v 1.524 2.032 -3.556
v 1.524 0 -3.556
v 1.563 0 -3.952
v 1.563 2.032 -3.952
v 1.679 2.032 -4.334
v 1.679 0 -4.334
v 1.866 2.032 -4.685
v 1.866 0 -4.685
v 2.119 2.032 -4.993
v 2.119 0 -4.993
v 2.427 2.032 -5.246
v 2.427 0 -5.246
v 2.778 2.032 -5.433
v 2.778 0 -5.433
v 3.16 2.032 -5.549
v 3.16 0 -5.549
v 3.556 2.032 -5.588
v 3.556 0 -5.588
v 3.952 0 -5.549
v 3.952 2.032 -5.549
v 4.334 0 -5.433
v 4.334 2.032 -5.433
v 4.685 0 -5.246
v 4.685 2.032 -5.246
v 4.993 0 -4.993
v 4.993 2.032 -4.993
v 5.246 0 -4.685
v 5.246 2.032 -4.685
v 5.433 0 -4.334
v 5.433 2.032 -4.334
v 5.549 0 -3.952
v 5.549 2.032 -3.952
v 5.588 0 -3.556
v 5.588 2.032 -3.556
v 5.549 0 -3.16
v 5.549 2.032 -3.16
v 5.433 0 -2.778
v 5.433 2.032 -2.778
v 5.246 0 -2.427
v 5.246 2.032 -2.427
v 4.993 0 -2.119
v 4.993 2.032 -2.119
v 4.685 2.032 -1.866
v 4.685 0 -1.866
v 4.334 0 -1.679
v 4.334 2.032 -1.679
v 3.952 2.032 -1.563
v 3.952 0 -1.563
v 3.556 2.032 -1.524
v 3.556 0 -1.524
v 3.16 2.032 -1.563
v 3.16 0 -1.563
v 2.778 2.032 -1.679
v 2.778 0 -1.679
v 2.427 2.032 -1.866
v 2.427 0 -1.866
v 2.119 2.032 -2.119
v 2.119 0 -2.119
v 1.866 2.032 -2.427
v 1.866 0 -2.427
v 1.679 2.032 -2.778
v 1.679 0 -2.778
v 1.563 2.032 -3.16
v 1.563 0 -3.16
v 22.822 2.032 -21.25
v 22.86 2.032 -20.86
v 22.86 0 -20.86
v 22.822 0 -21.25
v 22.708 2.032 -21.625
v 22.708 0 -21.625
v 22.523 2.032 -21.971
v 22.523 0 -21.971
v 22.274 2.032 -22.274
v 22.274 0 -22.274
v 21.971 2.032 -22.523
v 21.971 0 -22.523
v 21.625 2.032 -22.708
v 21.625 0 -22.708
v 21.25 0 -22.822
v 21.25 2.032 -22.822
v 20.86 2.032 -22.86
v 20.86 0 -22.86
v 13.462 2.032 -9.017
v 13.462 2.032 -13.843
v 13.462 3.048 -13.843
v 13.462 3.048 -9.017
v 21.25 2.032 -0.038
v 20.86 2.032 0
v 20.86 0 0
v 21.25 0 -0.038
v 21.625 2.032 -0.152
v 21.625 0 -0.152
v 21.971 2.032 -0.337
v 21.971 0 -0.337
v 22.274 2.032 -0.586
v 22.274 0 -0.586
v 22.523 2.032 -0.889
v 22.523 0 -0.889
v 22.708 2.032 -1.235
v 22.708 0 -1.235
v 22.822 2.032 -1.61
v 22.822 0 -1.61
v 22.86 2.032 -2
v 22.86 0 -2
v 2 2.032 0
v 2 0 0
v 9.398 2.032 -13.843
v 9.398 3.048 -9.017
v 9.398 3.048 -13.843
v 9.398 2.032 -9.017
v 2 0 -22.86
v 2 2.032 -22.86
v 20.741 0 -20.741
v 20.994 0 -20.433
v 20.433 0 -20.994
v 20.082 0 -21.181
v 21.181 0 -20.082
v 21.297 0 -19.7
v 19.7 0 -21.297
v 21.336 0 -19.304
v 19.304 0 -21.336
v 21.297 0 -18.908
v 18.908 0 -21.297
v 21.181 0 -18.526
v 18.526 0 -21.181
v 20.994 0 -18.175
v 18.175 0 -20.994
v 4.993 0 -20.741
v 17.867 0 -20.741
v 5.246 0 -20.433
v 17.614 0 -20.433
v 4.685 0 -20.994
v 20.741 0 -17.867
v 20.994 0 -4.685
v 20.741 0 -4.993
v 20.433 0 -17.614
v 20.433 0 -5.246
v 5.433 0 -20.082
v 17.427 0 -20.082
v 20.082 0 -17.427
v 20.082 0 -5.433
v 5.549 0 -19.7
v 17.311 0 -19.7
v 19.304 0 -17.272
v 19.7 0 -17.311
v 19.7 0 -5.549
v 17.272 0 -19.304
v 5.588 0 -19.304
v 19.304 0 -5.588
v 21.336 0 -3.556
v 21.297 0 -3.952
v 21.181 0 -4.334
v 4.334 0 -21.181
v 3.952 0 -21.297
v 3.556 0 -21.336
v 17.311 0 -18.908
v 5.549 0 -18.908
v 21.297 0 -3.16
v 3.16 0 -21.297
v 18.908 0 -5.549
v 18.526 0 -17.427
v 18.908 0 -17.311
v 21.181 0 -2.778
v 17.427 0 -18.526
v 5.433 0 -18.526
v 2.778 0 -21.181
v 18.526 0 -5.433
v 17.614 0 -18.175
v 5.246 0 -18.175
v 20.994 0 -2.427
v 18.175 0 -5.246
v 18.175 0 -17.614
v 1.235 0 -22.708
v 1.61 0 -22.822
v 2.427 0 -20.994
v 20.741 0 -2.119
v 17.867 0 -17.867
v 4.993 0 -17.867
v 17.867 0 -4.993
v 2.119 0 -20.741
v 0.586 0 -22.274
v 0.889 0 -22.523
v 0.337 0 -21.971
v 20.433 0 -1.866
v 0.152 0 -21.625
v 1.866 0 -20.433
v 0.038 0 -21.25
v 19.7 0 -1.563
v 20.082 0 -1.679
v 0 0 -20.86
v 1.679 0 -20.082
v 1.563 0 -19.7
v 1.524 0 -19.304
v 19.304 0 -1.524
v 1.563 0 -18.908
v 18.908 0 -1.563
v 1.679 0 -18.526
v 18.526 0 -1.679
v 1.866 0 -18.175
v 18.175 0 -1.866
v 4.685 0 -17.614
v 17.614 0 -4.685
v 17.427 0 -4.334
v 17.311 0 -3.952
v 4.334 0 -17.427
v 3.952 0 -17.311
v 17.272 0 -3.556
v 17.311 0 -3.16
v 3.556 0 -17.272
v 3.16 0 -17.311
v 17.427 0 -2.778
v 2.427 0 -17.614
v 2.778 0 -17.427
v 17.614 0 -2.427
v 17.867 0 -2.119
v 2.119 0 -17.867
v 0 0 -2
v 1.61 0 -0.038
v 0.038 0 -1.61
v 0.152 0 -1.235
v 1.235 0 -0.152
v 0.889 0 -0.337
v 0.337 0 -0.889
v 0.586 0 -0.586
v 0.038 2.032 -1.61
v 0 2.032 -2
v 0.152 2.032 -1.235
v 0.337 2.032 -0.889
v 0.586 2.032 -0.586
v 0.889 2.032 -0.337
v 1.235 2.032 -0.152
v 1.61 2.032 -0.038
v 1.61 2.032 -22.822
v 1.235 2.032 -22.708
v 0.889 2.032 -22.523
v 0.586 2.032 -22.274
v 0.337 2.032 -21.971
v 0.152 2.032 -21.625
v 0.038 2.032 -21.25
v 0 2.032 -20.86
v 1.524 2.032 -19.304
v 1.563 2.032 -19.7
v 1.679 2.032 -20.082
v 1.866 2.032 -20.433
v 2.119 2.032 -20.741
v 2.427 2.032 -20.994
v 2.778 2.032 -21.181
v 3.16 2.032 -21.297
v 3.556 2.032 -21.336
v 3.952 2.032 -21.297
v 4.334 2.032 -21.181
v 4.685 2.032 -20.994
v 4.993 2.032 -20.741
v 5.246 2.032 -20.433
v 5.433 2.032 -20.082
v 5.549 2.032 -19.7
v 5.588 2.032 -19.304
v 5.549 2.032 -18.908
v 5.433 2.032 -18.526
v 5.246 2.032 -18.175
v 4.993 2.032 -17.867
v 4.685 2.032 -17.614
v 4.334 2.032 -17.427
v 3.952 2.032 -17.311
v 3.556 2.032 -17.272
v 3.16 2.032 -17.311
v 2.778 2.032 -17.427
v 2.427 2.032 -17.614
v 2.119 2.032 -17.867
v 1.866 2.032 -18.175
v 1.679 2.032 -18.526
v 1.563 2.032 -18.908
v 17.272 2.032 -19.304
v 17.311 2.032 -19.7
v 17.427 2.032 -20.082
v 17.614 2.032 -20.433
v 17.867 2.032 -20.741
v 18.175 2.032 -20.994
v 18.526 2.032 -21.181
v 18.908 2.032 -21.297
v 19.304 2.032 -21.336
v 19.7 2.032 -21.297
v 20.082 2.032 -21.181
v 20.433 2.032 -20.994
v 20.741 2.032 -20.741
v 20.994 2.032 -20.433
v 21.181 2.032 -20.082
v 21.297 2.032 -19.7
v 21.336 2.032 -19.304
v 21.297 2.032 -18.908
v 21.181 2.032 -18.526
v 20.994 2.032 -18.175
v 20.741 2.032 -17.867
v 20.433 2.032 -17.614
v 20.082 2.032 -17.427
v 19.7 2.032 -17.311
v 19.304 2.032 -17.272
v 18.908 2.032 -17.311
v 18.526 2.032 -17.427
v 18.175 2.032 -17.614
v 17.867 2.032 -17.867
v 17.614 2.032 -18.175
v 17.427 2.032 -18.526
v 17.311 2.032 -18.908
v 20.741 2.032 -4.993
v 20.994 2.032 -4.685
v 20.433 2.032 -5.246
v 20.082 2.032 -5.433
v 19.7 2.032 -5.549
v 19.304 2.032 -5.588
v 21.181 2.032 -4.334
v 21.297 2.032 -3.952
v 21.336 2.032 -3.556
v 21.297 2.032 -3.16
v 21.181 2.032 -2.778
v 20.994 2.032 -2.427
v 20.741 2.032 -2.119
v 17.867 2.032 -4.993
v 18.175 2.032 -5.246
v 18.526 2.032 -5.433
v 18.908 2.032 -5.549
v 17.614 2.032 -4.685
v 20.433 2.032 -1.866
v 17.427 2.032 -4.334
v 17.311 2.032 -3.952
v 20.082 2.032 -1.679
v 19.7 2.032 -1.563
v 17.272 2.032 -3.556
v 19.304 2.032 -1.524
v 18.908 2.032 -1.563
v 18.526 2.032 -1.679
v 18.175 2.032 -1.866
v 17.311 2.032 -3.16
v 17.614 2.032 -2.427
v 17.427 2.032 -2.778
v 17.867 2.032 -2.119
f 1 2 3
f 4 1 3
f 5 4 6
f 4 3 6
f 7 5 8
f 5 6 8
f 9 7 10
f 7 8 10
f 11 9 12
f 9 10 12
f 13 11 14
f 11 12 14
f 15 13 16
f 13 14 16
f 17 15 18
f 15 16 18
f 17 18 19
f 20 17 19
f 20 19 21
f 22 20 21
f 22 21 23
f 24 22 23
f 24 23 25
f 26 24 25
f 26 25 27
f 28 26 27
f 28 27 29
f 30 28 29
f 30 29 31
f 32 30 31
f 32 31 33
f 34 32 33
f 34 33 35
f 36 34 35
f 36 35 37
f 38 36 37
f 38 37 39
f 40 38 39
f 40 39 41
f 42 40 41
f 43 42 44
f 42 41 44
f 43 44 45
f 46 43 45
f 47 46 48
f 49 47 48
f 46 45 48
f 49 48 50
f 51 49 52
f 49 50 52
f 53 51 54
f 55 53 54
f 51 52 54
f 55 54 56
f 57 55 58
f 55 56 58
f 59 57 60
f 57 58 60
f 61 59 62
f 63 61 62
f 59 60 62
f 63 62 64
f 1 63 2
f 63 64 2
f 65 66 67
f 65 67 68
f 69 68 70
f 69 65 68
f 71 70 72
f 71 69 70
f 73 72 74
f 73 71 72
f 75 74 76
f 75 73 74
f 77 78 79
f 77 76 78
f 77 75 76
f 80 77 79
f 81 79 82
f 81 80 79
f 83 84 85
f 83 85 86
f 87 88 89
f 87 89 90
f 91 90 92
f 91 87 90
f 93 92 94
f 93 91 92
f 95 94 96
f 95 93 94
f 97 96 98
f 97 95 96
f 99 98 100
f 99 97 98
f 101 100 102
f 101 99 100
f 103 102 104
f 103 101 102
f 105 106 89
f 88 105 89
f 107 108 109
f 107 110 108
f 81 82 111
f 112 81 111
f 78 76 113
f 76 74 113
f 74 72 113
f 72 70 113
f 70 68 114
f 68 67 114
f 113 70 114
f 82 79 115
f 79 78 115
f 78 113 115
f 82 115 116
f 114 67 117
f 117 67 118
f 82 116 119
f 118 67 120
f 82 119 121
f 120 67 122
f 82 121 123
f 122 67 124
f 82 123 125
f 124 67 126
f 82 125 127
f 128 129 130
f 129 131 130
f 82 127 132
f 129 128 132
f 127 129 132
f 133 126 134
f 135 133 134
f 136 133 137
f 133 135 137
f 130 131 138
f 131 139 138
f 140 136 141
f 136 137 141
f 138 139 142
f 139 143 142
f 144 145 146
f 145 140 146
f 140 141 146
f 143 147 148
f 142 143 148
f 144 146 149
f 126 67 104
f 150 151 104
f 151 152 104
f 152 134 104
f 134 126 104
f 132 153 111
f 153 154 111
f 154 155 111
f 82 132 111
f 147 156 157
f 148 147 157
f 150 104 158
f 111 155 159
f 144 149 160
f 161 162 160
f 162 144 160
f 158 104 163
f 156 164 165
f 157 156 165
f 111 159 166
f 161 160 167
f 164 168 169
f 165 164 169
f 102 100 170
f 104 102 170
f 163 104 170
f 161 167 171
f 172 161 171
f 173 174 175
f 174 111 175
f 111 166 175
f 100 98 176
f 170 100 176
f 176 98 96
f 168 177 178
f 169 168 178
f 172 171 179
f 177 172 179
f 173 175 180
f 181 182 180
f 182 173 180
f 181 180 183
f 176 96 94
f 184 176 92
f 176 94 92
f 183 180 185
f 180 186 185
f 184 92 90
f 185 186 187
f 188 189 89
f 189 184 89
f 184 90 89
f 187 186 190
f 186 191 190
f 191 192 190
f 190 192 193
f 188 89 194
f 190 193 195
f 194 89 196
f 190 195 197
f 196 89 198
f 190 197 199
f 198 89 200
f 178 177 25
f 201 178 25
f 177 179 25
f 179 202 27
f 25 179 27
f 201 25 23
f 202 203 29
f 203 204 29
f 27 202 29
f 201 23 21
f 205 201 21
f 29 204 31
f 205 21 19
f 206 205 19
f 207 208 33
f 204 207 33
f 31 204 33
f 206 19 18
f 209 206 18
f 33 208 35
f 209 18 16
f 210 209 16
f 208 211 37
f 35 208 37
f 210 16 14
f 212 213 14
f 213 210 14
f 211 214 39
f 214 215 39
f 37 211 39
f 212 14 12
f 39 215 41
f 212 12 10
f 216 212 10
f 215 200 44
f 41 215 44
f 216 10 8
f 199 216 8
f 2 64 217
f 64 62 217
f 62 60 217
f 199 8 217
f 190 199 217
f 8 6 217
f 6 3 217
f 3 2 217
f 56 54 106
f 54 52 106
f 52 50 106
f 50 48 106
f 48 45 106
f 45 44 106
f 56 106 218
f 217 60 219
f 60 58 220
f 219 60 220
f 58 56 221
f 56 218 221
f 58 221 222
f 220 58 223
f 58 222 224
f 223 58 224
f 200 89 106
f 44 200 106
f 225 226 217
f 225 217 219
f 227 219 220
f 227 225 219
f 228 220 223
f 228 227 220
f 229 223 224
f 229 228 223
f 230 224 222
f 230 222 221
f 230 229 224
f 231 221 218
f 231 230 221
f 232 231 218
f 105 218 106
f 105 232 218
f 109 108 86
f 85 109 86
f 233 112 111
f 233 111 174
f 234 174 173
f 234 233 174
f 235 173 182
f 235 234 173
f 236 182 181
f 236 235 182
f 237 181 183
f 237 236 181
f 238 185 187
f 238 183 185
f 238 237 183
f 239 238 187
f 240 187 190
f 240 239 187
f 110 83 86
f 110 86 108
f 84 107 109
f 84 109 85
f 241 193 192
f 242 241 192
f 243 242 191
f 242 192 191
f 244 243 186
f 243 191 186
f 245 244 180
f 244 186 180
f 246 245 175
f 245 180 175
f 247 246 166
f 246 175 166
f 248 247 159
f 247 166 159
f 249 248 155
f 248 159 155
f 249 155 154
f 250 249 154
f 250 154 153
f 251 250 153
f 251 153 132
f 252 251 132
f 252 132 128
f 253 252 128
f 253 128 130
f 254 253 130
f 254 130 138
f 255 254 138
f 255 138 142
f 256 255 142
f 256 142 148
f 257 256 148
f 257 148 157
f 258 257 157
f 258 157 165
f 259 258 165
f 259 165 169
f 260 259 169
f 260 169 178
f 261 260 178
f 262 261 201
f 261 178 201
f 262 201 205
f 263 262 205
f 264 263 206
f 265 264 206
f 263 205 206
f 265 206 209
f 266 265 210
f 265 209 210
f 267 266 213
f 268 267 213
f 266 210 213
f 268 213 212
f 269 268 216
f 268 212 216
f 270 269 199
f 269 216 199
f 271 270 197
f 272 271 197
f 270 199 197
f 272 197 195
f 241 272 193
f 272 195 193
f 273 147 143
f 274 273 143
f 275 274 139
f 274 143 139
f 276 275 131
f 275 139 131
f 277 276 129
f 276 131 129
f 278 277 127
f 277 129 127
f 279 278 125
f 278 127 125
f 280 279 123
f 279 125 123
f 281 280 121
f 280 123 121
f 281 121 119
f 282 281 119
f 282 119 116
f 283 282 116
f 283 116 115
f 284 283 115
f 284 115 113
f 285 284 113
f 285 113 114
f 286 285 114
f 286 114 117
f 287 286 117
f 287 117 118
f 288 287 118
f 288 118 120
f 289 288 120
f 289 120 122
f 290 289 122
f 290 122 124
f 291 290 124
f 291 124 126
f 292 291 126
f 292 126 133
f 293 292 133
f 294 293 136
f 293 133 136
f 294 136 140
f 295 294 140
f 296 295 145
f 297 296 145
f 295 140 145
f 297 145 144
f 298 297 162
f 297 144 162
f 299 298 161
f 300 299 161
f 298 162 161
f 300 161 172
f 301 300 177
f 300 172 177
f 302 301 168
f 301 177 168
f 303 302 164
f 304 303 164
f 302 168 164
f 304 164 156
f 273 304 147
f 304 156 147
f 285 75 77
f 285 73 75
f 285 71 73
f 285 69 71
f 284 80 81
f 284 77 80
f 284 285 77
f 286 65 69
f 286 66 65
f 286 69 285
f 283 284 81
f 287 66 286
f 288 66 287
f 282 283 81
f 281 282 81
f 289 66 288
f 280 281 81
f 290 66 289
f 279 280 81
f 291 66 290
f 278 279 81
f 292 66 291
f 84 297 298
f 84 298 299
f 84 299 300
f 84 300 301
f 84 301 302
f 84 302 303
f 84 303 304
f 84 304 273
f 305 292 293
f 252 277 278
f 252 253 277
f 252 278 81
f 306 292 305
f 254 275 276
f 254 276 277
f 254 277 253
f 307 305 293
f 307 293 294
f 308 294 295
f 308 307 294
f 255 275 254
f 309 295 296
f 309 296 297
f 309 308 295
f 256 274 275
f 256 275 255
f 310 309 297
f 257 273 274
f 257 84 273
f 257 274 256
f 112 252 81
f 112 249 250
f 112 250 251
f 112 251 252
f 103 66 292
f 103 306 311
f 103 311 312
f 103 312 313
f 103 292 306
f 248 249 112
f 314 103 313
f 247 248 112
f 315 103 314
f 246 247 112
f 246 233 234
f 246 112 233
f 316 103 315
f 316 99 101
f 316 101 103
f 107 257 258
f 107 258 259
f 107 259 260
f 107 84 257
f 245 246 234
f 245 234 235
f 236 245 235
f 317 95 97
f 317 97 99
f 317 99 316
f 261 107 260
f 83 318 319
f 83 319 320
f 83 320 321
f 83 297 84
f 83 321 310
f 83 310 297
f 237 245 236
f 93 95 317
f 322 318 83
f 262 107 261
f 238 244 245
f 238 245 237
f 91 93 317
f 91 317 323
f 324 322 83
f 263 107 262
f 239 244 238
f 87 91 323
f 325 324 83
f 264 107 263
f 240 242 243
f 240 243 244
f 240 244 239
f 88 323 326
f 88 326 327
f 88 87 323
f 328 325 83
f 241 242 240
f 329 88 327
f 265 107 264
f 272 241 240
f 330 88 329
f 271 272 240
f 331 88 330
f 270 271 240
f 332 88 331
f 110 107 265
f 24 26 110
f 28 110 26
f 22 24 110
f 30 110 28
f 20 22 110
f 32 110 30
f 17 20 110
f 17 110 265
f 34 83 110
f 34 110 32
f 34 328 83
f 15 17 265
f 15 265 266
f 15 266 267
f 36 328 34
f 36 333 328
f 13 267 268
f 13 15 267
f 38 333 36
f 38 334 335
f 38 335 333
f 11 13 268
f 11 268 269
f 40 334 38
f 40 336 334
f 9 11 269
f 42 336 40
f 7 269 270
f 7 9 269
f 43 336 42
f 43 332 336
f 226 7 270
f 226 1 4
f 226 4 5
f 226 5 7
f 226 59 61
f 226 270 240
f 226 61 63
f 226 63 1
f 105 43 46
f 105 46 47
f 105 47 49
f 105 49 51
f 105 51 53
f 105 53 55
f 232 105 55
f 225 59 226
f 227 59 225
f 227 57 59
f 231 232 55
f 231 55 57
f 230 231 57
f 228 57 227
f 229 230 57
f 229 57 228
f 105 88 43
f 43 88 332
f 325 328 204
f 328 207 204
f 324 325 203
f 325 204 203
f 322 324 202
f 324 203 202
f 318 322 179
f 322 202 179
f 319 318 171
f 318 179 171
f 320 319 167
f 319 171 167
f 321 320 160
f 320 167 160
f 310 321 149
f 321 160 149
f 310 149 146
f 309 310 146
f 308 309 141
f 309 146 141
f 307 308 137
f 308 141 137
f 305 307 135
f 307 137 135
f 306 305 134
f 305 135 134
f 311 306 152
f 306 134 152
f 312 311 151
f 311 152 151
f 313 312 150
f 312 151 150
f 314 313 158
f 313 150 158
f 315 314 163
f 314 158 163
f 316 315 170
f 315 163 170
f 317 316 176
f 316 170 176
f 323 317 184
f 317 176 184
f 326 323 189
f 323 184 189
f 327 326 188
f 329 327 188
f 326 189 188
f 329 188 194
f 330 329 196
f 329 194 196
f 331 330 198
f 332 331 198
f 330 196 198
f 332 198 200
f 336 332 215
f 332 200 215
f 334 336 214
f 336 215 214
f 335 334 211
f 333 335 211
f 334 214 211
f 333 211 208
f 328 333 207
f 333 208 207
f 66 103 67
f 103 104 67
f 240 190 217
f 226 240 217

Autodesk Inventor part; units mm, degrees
ref_plane "YZ Plane" through (0, 0, 0) normal (1, 0, 0) x (0, 1, 0)
ref_plane "XZ Plane" through (0, 0, 0) normal (0, 1, 0) x (-1, 0, 0)
ref_plane "XY Plane" through (0, 0, 0) normal (0, 0, 1) x (1, 0, 0)
sketch "Sketch1" plane through (0, 0, 0) normal (0, 1, 0) x (-1, 0, 0)
  line L0 (0, 0) -> (-22.86, 0)
  line L1 (-22.86, 0) -> (-22.86, -22.86)
  line L2 (-22.86, -22.86) -> (0, -22.86)
  line L3 (0, -22.86) -> (0, 0)
  line L4 (-22.86, -22.86) -> (-19.304, -22.86)
  line L5 (-19.304, -22.86) -> (-19.304, -19.304) construction
  line L6 (-19.304, -19.304) -> (-22.86, -19.304) construction
  line L7 (-22.86, -19.304) -> (-22.86, -22.86)
  line L8 (0, -22.86) -> (-3.556, -22.86)
  line L9 (-3.556, -22.86) -> (-3.556, -19.304) construction
  line L10 (-3.556, -19.304) -> (0, -19.304) construction
  line L11 (0, -19.304) -> (0, -22.86)
  line L12 (0, 0) -> (-3.556, 0)
  line L13 (-3.556, 0) -> (-3.556, -3.556) construction
  line L14 (-3.556, -3.556) -> (0, -3.556) construction
  line L15 (0, -3.556) -> (0, 0)
  line L16 (-22.86, 0) -> (-19.304, 0)
  line L17 (-19.304, 0) -> (-19.304, -3.556) construction
  line L18 (-19.304, -3.556) -> (-22.86, -3.556) construction
  line L19 (-22.86, -3.556) -> (-22.86, 0)
  circle A0 centre (-3.556, -19.304) radius 2.032
  circle A1 centre (-19.304, -19.304) radius 2.032
  circle A2 centre (-19.304, -3.556) radius 2.032
  circle A3 centre (-3.556, -3.556) radius 2.032
  line L20 (-3.556, -19.304) -> (-19.304, -19.304)
  line L21 (-19.304, -19.304) -> (-19.304, -3.556)
  line L22 (-19.304, -3.556) -> (-3.556, -3.556)
  line L23 (-3.556, -3.556) -> (-3.556, -19.304)
  dimension "d0" = 22.86
  dimension "d1" = 22.86
  dimension "d2" = 3.556
  dimension "d3" = 3.556
  dimension "d4" = 3.556
  dimension "d5" = 3.556
  dimension "d6" = 3.556
  dimension "d7" = 3.556
  dimension "d8" = 3.556
  dimension "d9" = 3.556
  dimension "d10" = 4.064
  dimension "d11" = 4.064
  dimension "d12" = 4.064
  dimension "d13" = 4.064
extrude "Extrusion1" add sketch "Sketch1" along normal blind 2.032 contours L3 L2 L1 L0 | A0 L20 A1 L21 A2 L22 A3 L23
fillet "Fillet1" radius 2 4 edges at (0, 1.016, 0) (22.86, 1.016, 0) (22.86, 1.016, -22.86) (0, 1.016, -22.86)
sketch "Sketch2" plane through (0, 2.032, 0) normal (0, 1, 0) x (1, 0, 0)
  line L0 (9.398, 13.843) -> (13.462, 13.843)
  line L1 (13.462, 13.843) -> (13.462, 9.017)
  line L2 (13.462, 9.017) -> (9.398, 9.017)
  line L3 (9.398, 9.017) -> (9.398, 13.843)
  line L4 (9.398, 13.843) -> (13.462, 9.017) construction
  line L5 (13.462, 13.843) -> (9.398, 9.017) construction
  line L6 (22.86, 2) -> (22.86, 20.86) projected
  line L7 (20.86, 22.86) -> (2, 22.86) projected
  point P0 (0, 0)
  point P1 (11.43, 11.43)
  dimension "d17" = 4.064
  dimension "d18" = 4.826
  dimension "d19" = 11.43
  dimension "d20" = 11.43
extrude "Extrusion2" add sketch "Sketch2" along normal blind 1.016
properties part number "as5600"
